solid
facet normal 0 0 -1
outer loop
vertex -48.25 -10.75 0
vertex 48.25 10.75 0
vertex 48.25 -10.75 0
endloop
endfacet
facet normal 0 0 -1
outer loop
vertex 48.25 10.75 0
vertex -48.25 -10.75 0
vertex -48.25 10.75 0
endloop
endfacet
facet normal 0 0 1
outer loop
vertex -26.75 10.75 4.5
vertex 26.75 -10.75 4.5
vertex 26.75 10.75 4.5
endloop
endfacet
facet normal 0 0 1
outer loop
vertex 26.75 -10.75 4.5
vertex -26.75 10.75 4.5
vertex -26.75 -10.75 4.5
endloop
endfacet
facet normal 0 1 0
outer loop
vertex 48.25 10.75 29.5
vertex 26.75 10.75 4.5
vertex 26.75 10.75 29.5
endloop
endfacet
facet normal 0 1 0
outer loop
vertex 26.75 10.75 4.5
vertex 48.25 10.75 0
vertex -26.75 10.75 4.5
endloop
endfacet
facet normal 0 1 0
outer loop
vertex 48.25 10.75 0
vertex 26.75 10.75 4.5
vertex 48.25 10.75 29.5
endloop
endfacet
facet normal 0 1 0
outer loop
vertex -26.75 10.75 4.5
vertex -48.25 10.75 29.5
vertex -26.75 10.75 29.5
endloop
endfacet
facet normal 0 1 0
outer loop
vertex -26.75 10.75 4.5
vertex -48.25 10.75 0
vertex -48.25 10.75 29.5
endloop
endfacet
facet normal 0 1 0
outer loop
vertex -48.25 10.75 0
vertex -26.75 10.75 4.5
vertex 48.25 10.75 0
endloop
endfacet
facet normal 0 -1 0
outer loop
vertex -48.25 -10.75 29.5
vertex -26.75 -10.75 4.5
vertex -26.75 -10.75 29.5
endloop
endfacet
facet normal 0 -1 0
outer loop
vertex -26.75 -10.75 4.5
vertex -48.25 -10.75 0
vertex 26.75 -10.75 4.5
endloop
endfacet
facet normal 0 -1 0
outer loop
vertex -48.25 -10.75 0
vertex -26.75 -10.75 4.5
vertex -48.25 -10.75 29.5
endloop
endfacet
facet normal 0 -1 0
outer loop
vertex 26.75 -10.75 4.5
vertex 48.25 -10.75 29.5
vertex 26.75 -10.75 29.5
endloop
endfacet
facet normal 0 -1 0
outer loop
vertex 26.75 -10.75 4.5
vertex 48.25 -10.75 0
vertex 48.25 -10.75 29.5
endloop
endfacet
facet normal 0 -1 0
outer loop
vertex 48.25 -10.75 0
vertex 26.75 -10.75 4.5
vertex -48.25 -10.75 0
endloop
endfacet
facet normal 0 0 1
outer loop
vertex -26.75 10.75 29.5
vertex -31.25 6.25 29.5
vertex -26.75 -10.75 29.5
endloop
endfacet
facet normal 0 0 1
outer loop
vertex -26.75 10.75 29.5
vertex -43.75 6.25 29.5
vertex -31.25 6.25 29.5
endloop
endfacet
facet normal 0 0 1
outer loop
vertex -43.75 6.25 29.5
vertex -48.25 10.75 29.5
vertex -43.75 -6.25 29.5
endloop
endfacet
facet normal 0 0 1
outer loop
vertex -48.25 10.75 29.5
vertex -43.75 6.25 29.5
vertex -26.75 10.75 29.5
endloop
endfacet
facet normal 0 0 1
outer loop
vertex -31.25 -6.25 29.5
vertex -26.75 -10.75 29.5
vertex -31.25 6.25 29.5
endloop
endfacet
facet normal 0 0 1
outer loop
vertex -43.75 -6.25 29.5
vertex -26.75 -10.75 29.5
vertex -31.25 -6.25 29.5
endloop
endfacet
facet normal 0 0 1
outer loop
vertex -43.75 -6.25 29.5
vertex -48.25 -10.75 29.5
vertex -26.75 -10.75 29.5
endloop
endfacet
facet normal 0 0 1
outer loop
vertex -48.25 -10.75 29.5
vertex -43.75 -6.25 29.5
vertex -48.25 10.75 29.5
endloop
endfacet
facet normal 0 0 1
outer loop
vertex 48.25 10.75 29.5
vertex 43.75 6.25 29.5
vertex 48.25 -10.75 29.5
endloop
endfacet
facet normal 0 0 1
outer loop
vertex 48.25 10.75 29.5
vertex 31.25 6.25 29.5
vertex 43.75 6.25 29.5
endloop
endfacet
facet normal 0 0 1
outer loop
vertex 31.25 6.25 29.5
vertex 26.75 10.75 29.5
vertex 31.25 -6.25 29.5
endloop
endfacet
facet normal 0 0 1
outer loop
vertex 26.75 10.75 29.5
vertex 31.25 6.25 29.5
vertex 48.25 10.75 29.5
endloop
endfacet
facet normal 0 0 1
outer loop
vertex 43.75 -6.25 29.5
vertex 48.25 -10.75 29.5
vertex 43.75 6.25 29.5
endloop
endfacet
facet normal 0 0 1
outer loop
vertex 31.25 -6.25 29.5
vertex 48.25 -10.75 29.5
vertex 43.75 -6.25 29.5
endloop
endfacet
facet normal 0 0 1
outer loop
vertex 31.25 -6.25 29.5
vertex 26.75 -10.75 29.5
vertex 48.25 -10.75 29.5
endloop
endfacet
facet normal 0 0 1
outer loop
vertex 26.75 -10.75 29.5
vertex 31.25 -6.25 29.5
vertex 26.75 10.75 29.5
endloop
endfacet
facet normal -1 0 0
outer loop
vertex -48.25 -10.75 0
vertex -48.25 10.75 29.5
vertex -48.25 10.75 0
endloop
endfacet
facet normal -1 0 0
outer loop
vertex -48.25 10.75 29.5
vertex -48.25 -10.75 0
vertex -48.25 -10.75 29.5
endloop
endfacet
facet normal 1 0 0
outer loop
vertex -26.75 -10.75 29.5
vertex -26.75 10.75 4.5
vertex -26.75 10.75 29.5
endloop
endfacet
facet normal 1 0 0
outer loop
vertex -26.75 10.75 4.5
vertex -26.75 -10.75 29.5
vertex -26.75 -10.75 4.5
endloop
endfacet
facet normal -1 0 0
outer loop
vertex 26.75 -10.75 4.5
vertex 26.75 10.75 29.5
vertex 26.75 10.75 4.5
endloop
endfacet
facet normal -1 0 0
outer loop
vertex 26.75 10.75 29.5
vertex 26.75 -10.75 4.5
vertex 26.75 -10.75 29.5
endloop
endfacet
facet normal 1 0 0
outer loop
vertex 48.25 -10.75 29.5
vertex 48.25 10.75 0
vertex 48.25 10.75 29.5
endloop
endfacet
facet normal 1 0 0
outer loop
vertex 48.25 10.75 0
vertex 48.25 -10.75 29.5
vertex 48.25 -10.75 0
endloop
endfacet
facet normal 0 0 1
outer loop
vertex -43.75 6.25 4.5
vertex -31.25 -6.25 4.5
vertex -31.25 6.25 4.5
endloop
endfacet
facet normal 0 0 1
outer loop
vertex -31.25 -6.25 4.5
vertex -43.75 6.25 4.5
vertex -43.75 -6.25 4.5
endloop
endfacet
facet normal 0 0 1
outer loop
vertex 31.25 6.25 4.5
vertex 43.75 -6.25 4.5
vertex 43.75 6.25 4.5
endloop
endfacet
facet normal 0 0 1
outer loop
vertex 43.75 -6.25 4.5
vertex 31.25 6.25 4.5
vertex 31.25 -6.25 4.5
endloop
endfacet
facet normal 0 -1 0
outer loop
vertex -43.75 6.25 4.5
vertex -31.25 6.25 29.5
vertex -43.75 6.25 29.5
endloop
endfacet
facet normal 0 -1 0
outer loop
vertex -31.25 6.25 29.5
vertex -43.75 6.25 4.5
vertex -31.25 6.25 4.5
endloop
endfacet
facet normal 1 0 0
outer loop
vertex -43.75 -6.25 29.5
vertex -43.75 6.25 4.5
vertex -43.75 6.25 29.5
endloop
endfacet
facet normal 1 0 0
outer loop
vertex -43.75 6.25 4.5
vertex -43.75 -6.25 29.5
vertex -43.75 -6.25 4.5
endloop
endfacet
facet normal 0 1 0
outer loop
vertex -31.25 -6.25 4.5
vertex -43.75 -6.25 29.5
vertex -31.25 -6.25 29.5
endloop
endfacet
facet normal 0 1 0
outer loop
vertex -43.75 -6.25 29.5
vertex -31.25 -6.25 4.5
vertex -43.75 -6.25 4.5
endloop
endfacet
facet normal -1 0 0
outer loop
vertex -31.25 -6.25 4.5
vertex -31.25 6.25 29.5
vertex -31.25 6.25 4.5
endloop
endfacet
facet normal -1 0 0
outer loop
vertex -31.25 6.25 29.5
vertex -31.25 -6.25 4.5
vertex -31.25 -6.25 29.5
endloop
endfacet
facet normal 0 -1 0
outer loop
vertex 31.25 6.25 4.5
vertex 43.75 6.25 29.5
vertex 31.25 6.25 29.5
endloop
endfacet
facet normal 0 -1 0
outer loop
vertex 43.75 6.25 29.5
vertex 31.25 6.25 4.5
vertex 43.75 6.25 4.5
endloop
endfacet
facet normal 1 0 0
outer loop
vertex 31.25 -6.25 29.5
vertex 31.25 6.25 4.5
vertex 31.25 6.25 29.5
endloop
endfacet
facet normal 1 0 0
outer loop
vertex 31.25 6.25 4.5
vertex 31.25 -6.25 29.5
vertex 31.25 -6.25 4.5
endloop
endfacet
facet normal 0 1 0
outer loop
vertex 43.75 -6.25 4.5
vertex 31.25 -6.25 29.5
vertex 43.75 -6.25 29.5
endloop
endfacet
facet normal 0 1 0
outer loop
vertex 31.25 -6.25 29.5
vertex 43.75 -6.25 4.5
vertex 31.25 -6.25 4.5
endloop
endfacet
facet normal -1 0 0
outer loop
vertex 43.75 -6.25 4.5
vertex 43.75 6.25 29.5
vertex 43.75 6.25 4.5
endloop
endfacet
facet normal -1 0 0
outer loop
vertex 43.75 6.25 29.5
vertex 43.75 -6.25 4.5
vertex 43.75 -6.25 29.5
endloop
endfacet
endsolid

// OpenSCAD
bu = 12.5;
bumper_thick = 4.5;

difference() {
  union() {
    linear_extrude(bumper_thick) {
      square([6*bu+2*bumper_thick, bu+2*bumper_thick],center=true);
    }
    linear_extrude(2*bu+bumper_thick) {
      translate([-3*bu,0]) square(bu+2*bumper_thick,center=true);
      translate([3*bu,0]) square(bu+2*bumper_thick,center=true);
    }
  }
  translate([0,0,bumper_thick]) linear_extrude(2*bu) {
      translate([-3*bu,0]) square(bu,center=true);
      translate([3*bu,0]) square(bu,center=true);
    }
}
